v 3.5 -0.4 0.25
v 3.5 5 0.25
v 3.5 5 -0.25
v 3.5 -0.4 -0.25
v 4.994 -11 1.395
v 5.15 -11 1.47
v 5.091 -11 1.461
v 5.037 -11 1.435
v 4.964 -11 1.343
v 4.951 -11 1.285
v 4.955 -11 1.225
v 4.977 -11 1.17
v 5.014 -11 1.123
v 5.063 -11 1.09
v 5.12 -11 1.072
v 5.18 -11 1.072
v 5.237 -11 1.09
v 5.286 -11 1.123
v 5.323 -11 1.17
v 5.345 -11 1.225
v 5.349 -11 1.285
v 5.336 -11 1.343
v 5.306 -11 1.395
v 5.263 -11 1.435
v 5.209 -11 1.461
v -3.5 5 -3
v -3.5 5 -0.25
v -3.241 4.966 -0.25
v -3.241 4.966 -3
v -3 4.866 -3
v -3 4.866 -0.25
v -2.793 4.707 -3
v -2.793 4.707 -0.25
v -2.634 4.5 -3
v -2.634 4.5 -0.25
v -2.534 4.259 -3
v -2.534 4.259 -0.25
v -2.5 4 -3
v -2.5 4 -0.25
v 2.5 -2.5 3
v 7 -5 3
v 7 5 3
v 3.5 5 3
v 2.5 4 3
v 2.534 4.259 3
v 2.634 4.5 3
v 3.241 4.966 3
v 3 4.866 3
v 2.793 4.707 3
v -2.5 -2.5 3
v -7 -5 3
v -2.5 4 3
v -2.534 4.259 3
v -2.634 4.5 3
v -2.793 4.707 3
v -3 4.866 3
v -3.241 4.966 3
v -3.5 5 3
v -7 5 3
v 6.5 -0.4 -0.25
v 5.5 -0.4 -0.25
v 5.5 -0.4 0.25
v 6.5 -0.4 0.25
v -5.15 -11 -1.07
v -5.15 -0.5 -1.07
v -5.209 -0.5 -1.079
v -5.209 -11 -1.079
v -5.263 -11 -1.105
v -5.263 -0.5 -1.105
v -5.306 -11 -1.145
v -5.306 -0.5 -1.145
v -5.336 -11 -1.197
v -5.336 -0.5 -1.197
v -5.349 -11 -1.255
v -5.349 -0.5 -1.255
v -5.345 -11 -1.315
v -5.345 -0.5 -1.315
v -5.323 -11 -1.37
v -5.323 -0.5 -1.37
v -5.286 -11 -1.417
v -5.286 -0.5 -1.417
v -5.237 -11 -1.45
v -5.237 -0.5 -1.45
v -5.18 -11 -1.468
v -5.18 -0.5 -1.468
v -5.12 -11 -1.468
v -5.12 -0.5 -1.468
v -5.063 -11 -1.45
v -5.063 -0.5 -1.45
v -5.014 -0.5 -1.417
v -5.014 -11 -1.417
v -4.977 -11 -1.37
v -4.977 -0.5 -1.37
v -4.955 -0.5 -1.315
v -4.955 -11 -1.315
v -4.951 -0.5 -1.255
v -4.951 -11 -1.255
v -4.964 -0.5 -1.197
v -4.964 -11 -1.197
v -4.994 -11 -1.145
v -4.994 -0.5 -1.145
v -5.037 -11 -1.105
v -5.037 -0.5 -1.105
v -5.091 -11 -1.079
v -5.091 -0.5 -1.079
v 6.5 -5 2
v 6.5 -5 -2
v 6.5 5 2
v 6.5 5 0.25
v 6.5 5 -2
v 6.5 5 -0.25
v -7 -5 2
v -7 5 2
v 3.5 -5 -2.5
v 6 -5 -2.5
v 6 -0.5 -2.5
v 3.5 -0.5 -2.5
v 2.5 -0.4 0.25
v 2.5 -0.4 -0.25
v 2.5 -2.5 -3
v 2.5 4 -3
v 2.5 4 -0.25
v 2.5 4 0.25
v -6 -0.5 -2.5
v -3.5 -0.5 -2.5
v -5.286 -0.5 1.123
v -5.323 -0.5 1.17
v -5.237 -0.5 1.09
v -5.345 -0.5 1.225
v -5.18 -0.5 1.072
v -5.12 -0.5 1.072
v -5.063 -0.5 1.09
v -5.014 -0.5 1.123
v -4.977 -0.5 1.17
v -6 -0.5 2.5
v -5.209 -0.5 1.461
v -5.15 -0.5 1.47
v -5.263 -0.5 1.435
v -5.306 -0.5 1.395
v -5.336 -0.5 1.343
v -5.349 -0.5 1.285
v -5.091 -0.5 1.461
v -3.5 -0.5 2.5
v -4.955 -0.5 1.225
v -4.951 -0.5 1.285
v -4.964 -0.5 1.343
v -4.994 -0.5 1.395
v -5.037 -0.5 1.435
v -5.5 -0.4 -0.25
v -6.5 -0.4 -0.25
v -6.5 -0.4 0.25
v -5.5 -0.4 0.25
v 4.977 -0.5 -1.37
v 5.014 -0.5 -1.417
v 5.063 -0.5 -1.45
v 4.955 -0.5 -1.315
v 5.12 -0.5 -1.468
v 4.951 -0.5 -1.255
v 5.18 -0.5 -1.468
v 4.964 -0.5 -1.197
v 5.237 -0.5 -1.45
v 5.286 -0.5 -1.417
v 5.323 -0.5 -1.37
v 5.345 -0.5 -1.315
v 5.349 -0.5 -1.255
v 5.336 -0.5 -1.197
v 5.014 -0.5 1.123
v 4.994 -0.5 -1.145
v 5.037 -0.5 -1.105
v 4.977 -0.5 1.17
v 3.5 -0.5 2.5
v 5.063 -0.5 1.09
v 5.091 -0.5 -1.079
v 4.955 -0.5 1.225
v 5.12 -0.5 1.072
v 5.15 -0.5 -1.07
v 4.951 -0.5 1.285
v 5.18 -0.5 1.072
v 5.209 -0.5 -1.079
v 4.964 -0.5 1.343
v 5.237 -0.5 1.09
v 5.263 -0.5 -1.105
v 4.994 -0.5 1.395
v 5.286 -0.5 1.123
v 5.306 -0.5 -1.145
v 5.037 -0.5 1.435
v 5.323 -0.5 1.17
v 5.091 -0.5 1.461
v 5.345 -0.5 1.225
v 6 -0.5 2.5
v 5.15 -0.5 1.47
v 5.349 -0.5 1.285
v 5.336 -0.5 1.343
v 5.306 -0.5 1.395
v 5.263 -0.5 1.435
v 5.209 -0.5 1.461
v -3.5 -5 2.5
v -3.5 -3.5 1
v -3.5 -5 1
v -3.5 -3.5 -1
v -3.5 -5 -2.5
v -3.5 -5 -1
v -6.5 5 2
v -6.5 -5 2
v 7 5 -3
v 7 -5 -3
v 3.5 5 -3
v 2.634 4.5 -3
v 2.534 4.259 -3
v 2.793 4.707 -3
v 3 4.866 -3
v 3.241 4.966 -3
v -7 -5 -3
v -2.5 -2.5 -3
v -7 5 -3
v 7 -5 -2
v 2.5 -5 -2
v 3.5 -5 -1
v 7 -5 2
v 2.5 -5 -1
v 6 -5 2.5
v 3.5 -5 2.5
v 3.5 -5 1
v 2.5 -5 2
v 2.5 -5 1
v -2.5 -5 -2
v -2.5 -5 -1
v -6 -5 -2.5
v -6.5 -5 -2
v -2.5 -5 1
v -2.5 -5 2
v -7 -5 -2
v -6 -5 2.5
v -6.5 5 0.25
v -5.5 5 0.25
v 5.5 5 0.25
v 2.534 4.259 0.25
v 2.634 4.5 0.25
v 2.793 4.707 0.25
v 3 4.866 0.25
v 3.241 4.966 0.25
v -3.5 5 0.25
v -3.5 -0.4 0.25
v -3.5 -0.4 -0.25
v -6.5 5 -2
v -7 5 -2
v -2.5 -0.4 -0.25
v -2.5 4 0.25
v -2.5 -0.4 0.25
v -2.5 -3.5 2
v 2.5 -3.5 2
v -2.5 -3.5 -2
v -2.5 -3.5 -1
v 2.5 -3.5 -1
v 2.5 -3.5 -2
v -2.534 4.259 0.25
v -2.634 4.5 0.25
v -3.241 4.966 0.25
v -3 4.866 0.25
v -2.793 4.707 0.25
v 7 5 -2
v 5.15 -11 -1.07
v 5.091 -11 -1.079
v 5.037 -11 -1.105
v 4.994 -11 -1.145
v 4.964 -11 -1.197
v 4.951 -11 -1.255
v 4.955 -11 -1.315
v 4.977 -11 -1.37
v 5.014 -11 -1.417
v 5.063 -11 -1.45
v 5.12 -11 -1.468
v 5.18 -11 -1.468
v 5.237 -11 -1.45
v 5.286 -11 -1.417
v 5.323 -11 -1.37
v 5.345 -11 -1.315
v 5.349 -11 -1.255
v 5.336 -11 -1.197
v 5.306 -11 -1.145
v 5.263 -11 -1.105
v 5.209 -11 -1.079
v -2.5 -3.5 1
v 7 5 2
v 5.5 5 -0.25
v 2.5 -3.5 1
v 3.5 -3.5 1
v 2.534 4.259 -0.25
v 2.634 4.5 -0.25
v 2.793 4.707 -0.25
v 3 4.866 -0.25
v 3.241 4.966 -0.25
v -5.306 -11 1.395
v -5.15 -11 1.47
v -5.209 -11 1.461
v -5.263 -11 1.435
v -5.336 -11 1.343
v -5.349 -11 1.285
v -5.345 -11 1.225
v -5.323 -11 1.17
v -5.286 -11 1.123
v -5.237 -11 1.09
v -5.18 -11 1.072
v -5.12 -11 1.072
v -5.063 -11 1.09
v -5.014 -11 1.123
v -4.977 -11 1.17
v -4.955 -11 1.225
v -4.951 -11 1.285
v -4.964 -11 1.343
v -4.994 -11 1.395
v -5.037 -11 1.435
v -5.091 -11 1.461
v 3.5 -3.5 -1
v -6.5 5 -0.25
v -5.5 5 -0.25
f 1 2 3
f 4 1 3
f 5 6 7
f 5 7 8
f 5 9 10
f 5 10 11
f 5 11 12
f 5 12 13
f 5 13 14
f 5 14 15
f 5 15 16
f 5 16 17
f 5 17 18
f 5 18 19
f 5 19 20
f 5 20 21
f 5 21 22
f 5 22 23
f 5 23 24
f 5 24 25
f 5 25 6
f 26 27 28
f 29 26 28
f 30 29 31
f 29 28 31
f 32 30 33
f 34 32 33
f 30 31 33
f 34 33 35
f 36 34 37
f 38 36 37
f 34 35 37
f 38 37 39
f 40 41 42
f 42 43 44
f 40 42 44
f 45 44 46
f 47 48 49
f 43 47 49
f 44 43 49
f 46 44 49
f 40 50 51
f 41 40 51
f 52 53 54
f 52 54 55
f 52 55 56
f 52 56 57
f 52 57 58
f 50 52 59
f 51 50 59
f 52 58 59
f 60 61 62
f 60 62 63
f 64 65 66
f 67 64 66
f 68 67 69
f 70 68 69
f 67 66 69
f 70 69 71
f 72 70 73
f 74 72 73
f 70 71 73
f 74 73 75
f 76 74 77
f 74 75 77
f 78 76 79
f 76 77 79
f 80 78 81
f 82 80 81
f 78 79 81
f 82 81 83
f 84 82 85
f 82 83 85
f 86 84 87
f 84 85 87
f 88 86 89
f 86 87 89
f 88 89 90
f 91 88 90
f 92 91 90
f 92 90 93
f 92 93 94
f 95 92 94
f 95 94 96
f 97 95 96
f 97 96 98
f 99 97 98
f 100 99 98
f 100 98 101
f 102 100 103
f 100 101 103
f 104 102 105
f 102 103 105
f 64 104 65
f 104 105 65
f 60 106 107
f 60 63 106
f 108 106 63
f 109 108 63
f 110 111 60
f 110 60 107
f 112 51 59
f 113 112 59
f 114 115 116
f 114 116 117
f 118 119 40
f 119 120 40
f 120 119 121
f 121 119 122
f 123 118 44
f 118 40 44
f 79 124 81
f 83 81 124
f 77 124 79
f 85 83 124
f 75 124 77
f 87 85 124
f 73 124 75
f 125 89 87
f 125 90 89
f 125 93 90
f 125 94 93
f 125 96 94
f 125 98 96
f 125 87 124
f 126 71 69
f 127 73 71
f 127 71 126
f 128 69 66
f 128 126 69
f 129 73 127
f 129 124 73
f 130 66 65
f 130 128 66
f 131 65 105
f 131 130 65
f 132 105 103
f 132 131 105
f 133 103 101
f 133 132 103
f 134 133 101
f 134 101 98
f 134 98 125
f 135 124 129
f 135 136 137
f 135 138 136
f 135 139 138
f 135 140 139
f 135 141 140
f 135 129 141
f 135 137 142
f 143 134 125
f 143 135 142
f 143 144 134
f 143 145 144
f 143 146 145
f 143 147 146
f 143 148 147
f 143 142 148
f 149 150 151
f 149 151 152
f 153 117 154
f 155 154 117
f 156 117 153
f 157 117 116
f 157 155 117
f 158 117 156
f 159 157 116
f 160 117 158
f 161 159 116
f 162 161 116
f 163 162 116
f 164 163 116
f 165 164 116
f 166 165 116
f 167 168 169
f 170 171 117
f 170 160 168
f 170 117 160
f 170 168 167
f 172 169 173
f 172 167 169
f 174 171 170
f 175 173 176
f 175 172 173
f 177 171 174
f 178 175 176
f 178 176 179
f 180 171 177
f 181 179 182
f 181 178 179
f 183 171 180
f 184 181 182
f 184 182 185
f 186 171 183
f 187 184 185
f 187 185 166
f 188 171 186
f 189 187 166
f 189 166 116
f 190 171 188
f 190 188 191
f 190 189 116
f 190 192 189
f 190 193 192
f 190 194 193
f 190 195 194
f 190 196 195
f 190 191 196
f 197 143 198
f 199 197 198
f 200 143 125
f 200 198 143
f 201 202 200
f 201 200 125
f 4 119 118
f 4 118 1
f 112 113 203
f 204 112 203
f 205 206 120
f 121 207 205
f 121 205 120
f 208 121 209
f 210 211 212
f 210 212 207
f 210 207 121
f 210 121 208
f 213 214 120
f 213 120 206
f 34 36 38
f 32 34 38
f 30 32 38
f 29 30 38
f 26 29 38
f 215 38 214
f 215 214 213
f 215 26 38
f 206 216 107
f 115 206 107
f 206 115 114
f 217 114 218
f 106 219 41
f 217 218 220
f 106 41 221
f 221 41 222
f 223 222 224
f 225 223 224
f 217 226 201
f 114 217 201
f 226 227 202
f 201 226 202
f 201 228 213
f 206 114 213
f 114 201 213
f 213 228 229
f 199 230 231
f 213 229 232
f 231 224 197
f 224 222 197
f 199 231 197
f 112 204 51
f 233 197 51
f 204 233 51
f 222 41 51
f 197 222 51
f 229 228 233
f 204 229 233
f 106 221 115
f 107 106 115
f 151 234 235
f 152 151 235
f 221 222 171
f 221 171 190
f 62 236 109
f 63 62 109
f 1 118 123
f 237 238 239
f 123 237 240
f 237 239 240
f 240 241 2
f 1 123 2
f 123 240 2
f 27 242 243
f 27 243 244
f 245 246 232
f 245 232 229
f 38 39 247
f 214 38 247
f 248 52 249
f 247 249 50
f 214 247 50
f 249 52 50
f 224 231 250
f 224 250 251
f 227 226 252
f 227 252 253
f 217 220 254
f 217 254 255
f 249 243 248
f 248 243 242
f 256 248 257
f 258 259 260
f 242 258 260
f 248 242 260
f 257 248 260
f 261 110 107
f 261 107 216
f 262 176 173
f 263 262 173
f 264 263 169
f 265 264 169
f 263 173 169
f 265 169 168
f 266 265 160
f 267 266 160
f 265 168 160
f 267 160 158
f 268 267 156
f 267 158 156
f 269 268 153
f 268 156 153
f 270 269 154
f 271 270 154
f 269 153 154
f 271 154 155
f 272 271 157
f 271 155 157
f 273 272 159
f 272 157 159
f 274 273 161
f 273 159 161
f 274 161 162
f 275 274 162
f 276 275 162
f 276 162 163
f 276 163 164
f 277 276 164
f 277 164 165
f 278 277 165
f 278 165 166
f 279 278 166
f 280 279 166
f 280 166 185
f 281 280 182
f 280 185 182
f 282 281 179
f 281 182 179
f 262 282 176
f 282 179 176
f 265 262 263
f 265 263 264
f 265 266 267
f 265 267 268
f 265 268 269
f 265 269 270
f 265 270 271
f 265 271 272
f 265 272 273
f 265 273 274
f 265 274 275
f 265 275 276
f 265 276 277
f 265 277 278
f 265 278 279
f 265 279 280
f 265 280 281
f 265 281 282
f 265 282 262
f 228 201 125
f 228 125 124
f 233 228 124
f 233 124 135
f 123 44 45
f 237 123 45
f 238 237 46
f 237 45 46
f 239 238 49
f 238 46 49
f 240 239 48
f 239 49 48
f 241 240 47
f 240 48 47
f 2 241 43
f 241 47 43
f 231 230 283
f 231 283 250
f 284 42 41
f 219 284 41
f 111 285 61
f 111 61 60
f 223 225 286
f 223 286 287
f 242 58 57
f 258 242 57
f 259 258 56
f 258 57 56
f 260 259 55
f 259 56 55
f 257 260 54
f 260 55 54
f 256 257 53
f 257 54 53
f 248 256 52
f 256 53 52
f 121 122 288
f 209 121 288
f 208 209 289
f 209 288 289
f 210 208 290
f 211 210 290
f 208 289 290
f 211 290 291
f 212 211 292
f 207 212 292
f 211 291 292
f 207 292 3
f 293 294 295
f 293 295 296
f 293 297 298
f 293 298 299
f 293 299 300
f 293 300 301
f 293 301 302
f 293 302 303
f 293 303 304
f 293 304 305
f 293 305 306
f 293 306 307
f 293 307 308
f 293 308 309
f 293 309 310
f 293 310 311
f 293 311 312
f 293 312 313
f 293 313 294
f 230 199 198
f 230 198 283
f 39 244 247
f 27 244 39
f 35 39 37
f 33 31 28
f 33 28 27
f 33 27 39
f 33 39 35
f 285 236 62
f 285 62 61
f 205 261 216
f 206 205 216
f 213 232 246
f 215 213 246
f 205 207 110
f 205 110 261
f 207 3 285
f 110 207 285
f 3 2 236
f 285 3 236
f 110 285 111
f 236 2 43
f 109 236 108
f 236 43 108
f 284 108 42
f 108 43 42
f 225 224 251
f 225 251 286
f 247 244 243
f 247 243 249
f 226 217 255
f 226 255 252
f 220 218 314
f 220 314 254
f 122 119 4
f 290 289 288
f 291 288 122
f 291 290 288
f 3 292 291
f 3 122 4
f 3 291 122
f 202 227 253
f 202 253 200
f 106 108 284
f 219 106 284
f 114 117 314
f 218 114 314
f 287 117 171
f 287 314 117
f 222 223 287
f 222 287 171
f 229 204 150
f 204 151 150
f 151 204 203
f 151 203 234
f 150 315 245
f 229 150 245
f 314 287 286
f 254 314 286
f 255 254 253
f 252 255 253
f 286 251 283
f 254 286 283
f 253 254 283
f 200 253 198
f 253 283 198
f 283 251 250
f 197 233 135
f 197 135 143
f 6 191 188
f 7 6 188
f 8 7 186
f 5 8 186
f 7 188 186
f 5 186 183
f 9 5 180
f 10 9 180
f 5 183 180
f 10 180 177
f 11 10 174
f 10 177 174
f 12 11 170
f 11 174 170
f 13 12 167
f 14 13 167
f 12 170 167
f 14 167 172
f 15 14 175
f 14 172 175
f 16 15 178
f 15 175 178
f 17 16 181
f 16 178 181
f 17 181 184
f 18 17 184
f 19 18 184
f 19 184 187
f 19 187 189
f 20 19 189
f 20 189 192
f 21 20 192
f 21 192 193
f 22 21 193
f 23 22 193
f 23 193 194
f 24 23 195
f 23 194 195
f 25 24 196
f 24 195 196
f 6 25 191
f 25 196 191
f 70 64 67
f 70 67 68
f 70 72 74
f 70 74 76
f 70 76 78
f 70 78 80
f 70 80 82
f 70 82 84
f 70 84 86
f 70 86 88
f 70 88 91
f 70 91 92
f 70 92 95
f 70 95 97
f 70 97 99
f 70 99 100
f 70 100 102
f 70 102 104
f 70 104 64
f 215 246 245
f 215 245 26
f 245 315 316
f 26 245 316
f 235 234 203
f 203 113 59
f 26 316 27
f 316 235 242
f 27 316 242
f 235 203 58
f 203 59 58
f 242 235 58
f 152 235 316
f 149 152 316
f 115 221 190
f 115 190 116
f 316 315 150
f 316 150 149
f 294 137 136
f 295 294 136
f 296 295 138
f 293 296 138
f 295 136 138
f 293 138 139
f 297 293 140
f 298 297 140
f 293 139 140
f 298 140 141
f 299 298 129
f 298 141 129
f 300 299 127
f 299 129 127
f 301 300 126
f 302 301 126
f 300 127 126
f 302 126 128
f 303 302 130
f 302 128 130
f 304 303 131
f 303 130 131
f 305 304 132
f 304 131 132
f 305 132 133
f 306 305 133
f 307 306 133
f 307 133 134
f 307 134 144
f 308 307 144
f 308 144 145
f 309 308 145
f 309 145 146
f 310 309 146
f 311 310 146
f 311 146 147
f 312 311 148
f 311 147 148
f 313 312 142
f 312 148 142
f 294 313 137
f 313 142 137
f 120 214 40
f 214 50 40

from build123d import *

# Parameters (mm, degrees)
BOSS_EXTRUDE1_DEPTH = 3
SKETCH4_W           = 0.5
SKETCH4_H           = 4
CUT_EXTRUDE2_DEPTH  = 13.56980509
SKETCH2_W           = 1
SKETCH2_H           = 0.5
CUT_EXTRUDE1_DEPTH  = 5.4
CUT_EXTRUDE3_DEPTH  = 1.5
SKETCH6_W           = 2.5
SKETCH6_H           = 5
CUT_EXTRUDE4_DEPTH  = 3
SKETCH7_R           = 0.2
BOSS_EXTRUDE2_DEPTH = 10.5


with BuildPart() as part:
    # Sketch1 → Boss-Extrude1 (new, symmetric)
    with BuildSketch(Plane.XY):
        with BuildLine():
            Line((-7, -5), (-7, 5))
            Line((-7, 5), (-3.5, 5))
            ThreePointArc((-3.5, 5), (-2.792893219, 4.707106781), (-2.5, 4))
            Line((-2.5, 4), (-2.5, -2.5))
            Line((-2.5, -2.5), (2.5, -2.5))
            Line((2.5, -2.5), (2.5, 4))
            ThreePointArc((2.5, 4), (2.792893219, 4.707106781), (3.5, 5))
            Line((3.5, 5), (7, 5))
            Line((7, 5), (7, -5))
            Line((7, -5), (-7, -5))
        make_face()
    extrude(amount=BOSS_EXTRUDE1_DEPTH, both=True)

    # Sketch4 → Cut-Extrude2 (cut, through all)
    with BuildSketch(Plane(origin=(0, 5, 0), x_dir=(1, 0, 0), z_dir=(0, 1, 0))):
        with Locations((-6.75, 0)):
            Rectangle(SKETCH4_W, SKETCH4_H)
        with Locations((6.75, 0)):
            Rectangle(SKETCH4_W, SKETCH4_H)
    extrude(amount=-CUT_EXTRUDE2_DEPTH, mode=Mode.SUBTRACT)

    # Sketch2 → Cut-Extrude1 (cut)
    with BuildSketch(Plane(origin=(0, 5, 0), x_dir=(1, 0, 0), z_dir=(0, 1, 0))):
        with Locations((-6, 0)):
            Rectangle(SKETCH2_W, SKETCH2_H)
        with Locations((-3, 0)):
            Rectangle(SKETCH2_W, SKETCH2_H)
        with Locations((3, 0)):
            Rectangle(SKETCH2_W, SKETCH2_H)
        with Locations((6, 0)):
            Rectangle(SKETCH2_W, SKETCH2_H)
    extrude(amount=-CUT_EXTRUDE1_DEPTH, mode=Mode.SUBTRACT)

    # Sketch5 → Cut-Extrude3 (cut)
    with BuildSketch(Plane.XZ.offset(5)):
        Polygon((-6, 2.5), (-3.5, 2.5), (-3.5, 1), (-2.5, 1), (-2.5, 2), (2.5, 2), (2.5, 1), (3.5, 1), (3.5, 2.5), (6, 2.5), (6, -2.5), (3.5, -2.5), (3.5, -1), (2.5, -1), (2.5, -2), (-2.5, -2), (-2.5, -1), (-3.5, -1), (-3.5, -2.5), (-6, -2.5), align=None)
    extrude(amount=-CUT_EXTRUDE3_DEPTH, mode=Mode.SUBTRACT)

    # Sketch6 → Cut-Extrude4 (cut)
    with BuildSketch(Plane.XZ.offset(3.5)):
        with Locations((-4.75, 0)):
            Rectangle(SKETCH6_W, SKETCH6_H)
        with Locations((4.75, 0)):
            Rectangle(SKETCH6_W, SKETCH6_H)
    extrude(amount=-CUT_EXTRUDE4_DEPTH, mode=Mode.SUBTRACT)

    # Sketch7 → Boss-Extrude2 (add)
    with BuildSketch(Plane.XZ.offset(0.5)):
        with Locations(Location((-5.15, -1.27, 0), (0, 0, 90))):
            Circle(SKETCH7_R)
        with Locations(Location((-5.15, 1.27, 0), (0, 0, 90))):
            Circle(SKETCH7_R)
        with Locations(Location((5.15, 1.27, 0), (0, 0, 90))):
            Circle(SKETCH7_R)
        with Locations(Location((5.15, -1.27, 0), (0, 0, 90))):
            Circle(SKETCH7_R)
    extrude(amount=BOSS_EXTRUDE2_DEPTH)


solid = part.part
